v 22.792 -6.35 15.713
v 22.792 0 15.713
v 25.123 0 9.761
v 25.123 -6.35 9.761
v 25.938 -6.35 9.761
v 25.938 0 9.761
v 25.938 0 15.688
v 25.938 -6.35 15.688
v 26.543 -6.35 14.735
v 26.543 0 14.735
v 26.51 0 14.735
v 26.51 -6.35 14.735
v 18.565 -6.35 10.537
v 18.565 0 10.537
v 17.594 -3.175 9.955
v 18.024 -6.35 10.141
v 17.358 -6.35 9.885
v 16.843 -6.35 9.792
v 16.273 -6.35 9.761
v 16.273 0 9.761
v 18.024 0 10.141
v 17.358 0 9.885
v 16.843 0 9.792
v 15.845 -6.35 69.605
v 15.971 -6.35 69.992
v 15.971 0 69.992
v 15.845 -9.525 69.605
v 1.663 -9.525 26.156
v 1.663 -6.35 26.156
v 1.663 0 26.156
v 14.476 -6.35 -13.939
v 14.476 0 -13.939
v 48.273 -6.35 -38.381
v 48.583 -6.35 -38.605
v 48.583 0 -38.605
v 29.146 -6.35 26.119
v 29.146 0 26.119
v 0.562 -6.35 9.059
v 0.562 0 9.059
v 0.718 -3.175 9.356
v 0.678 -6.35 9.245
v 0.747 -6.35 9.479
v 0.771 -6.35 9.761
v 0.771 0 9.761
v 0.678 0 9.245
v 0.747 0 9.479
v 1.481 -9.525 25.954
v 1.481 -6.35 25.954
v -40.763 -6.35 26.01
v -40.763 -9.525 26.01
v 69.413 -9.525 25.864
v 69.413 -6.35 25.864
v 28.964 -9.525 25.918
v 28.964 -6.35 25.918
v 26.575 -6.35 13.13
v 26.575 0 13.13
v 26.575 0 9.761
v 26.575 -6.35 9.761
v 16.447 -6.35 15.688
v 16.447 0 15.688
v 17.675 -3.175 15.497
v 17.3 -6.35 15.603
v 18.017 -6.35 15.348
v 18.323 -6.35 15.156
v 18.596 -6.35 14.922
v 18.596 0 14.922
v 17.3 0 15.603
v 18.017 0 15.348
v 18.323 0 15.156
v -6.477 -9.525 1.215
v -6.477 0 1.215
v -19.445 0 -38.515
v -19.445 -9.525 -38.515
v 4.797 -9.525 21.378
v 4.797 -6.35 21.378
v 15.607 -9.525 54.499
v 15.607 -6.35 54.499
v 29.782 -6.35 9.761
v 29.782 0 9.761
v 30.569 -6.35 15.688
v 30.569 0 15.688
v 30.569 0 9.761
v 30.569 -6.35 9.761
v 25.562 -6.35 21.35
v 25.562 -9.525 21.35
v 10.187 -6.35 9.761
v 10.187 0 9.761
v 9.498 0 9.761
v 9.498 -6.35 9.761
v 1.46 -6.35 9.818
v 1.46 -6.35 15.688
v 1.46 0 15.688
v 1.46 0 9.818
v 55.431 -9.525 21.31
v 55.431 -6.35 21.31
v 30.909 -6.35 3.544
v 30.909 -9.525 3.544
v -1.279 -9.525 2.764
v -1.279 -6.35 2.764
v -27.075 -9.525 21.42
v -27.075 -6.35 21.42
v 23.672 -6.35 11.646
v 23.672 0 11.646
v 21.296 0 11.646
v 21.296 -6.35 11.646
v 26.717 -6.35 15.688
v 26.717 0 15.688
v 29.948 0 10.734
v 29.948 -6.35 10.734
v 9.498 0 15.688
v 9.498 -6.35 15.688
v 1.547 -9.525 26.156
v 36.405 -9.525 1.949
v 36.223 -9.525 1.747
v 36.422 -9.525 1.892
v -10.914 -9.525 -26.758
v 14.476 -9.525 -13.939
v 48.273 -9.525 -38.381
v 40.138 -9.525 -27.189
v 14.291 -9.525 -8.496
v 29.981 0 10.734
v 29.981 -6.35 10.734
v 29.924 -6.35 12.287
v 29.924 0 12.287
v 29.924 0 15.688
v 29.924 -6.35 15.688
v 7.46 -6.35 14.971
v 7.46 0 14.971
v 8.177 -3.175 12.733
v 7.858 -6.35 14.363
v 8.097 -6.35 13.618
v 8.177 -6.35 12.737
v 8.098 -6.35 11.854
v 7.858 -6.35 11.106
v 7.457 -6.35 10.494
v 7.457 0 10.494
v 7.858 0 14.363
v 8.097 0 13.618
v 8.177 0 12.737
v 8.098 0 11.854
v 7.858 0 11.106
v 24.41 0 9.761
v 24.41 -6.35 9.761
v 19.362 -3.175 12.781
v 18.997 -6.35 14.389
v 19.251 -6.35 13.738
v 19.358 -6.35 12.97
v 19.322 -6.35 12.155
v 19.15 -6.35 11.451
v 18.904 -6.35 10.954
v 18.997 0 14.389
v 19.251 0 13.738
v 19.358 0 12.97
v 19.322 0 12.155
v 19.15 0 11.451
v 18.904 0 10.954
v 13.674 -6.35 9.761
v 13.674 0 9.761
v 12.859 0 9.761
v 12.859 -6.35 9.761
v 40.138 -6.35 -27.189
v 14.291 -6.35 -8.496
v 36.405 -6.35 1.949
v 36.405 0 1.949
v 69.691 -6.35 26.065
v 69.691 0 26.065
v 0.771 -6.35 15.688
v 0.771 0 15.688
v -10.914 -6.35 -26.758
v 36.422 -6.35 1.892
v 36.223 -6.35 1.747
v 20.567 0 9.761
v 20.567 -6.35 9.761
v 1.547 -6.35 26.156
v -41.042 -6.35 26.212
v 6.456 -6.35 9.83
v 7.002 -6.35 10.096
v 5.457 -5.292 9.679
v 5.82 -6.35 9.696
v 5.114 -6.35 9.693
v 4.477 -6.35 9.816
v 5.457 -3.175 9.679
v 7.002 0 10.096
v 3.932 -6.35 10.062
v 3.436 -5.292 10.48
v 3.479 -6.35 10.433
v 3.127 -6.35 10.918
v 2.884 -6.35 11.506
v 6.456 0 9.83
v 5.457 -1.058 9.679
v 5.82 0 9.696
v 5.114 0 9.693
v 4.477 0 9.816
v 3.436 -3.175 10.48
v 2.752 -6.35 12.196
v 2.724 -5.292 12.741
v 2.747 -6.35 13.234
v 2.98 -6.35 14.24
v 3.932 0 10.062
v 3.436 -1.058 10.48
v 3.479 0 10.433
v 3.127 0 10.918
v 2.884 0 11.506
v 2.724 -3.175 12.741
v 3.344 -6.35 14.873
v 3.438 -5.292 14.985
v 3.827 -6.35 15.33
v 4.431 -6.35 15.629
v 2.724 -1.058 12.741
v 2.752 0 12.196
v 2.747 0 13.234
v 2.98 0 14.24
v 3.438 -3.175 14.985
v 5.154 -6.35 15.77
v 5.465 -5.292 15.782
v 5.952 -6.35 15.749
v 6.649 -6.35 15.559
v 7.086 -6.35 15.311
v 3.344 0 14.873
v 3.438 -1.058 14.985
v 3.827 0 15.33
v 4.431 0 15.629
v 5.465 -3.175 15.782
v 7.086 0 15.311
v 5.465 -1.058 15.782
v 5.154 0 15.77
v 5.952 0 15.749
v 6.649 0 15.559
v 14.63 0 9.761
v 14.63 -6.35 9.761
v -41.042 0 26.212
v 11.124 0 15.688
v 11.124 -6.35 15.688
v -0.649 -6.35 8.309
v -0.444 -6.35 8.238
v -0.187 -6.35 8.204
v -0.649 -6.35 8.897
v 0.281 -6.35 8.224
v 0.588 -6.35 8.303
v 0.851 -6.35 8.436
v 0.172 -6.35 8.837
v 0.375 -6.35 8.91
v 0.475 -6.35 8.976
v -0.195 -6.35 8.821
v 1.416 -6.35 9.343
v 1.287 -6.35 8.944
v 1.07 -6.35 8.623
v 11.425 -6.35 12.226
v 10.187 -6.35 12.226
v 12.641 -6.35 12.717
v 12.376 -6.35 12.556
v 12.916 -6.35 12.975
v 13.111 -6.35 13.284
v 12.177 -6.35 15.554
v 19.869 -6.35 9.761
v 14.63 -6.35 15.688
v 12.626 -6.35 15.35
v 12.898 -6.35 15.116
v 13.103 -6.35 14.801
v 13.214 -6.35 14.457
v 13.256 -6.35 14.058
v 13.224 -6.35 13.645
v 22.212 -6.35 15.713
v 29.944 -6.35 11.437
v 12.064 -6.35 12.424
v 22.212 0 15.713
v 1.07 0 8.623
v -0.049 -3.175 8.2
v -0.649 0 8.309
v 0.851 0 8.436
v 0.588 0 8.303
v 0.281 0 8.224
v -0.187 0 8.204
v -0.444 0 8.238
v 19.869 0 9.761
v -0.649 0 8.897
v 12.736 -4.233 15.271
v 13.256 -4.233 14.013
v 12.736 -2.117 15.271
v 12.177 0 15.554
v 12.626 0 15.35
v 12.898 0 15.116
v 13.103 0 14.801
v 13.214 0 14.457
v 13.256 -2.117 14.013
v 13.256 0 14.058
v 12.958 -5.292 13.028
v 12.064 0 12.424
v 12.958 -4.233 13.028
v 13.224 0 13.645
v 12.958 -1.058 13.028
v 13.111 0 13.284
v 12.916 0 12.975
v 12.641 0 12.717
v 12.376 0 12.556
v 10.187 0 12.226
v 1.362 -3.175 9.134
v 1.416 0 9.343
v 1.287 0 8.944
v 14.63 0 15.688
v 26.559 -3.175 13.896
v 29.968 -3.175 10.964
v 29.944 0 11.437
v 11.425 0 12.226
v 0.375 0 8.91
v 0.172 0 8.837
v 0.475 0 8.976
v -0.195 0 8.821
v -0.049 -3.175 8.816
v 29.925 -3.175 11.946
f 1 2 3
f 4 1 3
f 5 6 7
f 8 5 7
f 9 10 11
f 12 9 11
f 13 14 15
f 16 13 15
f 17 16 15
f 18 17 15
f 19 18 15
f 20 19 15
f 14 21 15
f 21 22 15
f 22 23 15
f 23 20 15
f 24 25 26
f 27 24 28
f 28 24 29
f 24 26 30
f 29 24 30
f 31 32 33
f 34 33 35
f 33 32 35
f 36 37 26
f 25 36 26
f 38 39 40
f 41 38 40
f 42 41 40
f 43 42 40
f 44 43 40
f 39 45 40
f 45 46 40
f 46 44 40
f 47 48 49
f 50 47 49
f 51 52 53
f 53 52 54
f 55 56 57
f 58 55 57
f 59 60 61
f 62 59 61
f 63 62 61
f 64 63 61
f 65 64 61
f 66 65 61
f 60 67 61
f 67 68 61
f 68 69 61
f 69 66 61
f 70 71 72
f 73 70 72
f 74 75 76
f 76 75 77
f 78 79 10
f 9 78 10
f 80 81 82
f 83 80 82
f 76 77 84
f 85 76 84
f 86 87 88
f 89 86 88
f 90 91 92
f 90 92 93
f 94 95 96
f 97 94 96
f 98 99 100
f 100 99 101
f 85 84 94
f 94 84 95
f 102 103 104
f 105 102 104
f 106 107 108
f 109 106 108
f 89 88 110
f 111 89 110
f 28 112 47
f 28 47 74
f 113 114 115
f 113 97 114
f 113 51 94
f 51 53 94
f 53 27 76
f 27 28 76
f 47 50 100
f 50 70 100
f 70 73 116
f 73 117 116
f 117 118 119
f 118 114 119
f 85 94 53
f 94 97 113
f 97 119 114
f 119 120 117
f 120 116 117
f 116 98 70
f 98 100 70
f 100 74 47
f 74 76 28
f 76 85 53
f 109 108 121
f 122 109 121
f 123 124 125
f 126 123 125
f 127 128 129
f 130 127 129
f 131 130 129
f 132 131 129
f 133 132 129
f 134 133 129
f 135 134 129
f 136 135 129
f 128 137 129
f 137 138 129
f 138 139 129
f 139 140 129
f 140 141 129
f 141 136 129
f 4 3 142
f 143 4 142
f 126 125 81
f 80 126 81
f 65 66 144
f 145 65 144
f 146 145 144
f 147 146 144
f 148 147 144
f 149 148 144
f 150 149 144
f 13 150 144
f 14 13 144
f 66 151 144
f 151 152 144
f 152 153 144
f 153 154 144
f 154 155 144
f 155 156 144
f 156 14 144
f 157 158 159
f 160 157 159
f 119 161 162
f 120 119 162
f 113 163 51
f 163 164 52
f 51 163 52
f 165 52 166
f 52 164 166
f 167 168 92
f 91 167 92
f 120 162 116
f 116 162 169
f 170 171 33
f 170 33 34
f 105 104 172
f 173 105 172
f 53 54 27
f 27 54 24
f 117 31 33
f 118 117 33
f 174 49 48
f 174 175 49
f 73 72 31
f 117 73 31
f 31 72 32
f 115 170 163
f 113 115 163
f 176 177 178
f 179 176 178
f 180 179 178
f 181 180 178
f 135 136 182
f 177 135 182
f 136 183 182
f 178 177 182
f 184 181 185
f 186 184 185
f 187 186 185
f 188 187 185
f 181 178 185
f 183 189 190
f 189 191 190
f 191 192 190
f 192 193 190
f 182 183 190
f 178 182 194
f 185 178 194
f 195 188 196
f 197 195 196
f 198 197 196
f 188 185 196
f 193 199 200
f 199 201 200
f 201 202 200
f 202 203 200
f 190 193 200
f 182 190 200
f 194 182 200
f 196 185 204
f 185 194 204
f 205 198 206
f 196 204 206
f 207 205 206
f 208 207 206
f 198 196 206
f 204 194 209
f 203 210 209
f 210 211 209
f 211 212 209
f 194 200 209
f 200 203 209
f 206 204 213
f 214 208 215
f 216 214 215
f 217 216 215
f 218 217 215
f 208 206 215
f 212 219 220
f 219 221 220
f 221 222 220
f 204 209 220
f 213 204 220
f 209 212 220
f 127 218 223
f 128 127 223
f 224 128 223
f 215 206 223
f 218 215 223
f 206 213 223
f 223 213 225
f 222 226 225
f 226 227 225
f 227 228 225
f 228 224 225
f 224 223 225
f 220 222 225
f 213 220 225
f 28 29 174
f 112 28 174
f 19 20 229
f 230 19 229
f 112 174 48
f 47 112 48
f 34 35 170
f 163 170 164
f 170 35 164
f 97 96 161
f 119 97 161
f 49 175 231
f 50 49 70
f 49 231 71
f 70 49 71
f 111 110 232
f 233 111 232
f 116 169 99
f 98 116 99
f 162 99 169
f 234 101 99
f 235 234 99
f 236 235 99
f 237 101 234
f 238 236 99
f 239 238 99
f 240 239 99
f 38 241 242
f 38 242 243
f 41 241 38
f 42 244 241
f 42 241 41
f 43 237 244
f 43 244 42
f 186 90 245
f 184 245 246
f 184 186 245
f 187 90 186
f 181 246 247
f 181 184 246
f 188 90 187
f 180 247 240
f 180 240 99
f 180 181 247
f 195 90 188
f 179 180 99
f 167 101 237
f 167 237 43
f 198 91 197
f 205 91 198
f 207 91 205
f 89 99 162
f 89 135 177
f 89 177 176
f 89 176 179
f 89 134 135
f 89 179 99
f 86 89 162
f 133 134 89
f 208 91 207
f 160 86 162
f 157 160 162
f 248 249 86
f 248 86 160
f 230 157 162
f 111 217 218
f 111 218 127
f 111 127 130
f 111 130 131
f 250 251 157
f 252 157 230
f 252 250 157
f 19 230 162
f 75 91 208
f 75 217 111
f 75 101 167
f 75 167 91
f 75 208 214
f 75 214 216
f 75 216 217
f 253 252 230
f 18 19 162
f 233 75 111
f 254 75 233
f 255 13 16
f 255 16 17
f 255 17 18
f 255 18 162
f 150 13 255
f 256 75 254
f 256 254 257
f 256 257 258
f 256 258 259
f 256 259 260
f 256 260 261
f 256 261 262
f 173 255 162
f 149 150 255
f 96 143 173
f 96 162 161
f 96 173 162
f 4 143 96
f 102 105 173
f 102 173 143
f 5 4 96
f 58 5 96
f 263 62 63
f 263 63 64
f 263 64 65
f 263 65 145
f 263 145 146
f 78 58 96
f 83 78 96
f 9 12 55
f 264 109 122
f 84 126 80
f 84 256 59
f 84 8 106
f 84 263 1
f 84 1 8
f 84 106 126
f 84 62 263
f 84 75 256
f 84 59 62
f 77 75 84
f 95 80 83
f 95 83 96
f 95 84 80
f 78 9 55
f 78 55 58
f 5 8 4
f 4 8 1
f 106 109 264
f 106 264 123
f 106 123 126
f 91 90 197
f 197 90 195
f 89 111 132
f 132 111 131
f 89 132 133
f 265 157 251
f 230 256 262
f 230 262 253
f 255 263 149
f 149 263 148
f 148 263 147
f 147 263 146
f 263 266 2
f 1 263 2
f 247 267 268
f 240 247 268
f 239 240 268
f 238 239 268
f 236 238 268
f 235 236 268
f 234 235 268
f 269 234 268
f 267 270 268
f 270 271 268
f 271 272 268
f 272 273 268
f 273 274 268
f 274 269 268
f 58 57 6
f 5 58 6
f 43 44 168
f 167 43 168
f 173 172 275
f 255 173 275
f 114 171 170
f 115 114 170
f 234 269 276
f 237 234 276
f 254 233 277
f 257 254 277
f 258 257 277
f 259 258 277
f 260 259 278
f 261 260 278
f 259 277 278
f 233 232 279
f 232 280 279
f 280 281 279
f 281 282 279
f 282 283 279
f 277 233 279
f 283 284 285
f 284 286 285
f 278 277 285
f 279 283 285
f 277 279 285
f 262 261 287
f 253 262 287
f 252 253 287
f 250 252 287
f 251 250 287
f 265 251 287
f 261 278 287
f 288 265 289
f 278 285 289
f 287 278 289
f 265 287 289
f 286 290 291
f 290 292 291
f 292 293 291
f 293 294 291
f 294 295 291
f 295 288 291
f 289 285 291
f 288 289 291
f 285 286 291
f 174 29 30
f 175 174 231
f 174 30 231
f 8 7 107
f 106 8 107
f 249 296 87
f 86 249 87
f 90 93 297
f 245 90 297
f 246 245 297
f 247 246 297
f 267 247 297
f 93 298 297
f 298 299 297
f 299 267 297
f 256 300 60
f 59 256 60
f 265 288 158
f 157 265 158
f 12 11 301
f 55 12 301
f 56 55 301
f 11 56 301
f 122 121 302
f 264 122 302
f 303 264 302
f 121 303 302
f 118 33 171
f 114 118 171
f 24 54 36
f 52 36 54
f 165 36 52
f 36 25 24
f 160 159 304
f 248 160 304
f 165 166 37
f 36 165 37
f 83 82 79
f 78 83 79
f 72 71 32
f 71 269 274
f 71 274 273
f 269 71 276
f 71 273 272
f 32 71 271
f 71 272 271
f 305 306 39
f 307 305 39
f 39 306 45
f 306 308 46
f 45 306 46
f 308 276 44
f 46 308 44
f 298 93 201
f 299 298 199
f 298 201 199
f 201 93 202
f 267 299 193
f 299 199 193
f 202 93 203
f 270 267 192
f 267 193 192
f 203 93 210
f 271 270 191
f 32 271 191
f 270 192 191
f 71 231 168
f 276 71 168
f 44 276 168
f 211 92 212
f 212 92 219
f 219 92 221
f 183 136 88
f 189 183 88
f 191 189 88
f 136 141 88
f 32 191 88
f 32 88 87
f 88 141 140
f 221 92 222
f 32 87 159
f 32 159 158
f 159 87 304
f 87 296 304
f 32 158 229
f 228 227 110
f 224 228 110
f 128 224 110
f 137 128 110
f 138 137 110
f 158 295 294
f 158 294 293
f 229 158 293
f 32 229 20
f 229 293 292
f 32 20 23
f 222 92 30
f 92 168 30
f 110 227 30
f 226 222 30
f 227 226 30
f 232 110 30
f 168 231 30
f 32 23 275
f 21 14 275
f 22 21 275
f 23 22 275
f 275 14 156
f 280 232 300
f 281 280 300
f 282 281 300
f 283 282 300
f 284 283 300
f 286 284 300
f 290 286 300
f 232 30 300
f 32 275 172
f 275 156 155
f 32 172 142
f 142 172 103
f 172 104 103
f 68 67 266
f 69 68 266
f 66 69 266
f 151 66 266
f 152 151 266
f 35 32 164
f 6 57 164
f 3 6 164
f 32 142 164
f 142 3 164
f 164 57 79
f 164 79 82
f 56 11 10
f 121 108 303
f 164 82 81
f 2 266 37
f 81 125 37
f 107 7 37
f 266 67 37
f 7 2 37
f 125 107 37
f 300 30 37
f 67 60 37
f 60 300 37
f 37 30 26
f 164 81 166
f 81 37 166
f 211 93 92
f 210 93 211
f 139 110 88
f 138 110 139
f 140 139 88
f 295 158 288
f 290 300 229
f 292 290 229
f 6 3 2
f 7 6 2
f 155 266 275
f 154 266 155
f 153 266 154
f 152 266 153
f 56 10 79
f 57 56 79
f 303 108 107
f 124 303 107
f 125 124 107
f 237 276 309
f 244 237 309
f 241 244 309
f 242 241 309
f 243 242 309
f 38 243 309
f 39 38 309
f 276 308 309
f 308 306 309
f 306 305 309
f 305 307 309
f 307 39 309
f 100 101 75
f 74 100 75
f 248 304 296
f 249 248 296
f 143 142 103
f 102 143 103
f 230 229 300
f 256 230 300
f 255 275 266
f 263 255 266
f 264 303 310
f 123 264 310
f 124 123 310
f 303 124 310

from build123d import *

# Parameters (mm, degrees)
F1_DEPTH = 6.35
F3_DEPTH = 3.175


with BuildPart() as f1:
    # F0 (on Front) → F1 (new body)
    with BuildSketch(Plane.XZ):
        Polygon((36.4045640823, 1.9488933967), (69.6907226001, 26.065217087), (29.1461811696, 26.1190709712), (15.9708538221, 69.9924798862), (1.6629783111, 26.15557594), (-41.0424164863, 26.2123000095), (-6.4774139305, 1.2147947246), (-19.4446871391, -38.5147311336), (14.4759376997, -13.9387270281), (48.5830571498, -38.6050899867), align=None)
        with BuildLine():
            add(Edge.make_bspline(
                [(1.0703261445, 8.6234759039), (0.6811166374, 8.1998862237), (-0.0492998709, 8.1998862237)],
                knots=[0, 0, 0, 1, 1, 1], degree=2))
            add(Edge.make_bspline(
                [(-0.0492998709, 8.1998862237), (-0.4294278228, 8.1998862237), (-0.6486825118, 8.3088648857)],
                knots=[0, 0, 0, 1, 1, 1], degree=2))
            Line((-0.6486825118, 8.3088648857), (-0.6486825118, 8.8965712414))
            add(Edge.make_bspline(
                [(-0.6486825118, 8.8965712414), (-0.3606674766, 8.81613461), (-0.0492998709, 8.81613461)],
                knots=[0, 0, 0, 1, 1, 1], degree=2))
            add(Edge.make_bspline(
                [(-0.0492998709, 8.81613461), (0.3528832864, 8.81613461), (0.5617590552, 9.0593905519)],
                knots=[0, 0, 0, 1, 1, 1], degree=2))
            add(Edge.make_bspline(
                [(0.5617590552, 9.0593905519), (0.7706348241, 9.3026464938), (0.7706348241, 9.7606163472)],
                knots=[0, 0, 0, 1, 1, 1], degree=2))
            Line((0.7706348241, 9.7606163472), (0.7706348241, 15.6882771403))
            Line((0.7706348241, 15.6882771403), (1.4595356516, 15.6882771403))
            Line((1.4595356516, 15.6882771403), (1.4595356516, 9.8177004082))
            add(Edge.make_bspline(
                [(1.4595356516, 9.8177004082), (1.4595356516, 9.0470655842), (1.0703261445, 8.6234759039)],
                knots=[0, 0, 0, 1, 1, 1], degree=2))
        make_face(mode=Mode.SUBTRACT)
        with BuildLine():
            add(Edge.make_bspline(
                [(7.4598488861, 14.9708342823), (8.1772917442, 14.1599811425), (8.1772917442, 12.7328796164)],
                knots=[0, 0, 0, 1, 1, 1], degree=2))
            add(Edge.make_bspline(
                [(8.1772917442, 12.7328796164), (8.1772917442, 11.3096701855), (7.4572541561, 10.4942762681)],
                knots=[0, 0, 0, 1, 1, 1], degree=2))
            add(Edge.make_bspline(
                [(7.4572541561, 10.4942762681), (6.7372165679, 9.6788823507), (5.4567172896, 9.6788823507)],
                knots=[0, 0, 0, 1, 1, 1], degree=2))
            add(Edge.make_bspline(
                [(5.4567172896, 9.6788823507), (4.1476759807, 9.6788823507), (3.4360712652, 10.4800052528)],
                knots=[0, 0, 0, 1, 1, 1], degree=2))
            add(Edge.make_bspline(
                [(3.4360712652, 10.4800052528), (2.7244665497, 11.2811281549), (2.7244665497, 12.7406638066)],
                knots=[0, 0, 0, 1, 1, 1], degree=2))
            add(Edge.make_bspline(
                [(2.7244665497, 12.7406638066), (2.7244665497, 14.188523173), (3.4380173127, 14.9851052975)],
                knots=[0, 0, 0, 1, 1, 1], degree=2))
            add(Edge.make_bspline(
                [(3.4380173127, 14.9851052975), (4.1515680757, 15.781687422), (5.4645014797, 15.781687422)],
                knots=[0, 0, 0, 1, 1, 1], degree=2))
            add(Edge.make_bspline(
                [(5.4645014797, 15.781687422), (6.742406028, 15.781687422), (7.4598488861, 14.9708342823)],
                knots=[0, 0, 0, 1, 1, 1], degree=2))
        make_face(mode=Mode.SUBTRACT)
        with BuildLine():
            Line((11.4245963984, 12.2256098922), (10.1869101659, 12.2256098922))
            Line((10.1869101659, 12.2256098922), (10.1869101659, 9.7606163472))
            Line((10.1869101659, 9.7606163472), (9.4980093383, 9.7606163472))
            Line((9.4980093383, 9.7606163472), (9.4980093383, 15.6882771403))
            Line((9.4980093383, 15.6882771403), (11.1236077129, 15.6882771403))
            add(Edge.make_bspline(
                [(11.1236077129, 15.6882771403), (12.2146916979, 15.6882771403), (12.7355837549, 15.2705256027)],
                knots=[0, 0, 0, 1, 1, 1], degree=2))
            add(Edge.make_bspline(
                [(12.7355837549, 15.2705256027), (13.2564758119, 14.8527740651), (13.2564758119, 14.0133788948)],
                knots=[0, 0, 0, 1, 1, 1], degree=2))
            add(Edge.make_bspline(
                [(13.2564758119, 14.0133788948), (13.2564758119, 12.8379661833), (12.0641973551, 12.4241067408)],
                knots=[0, 0, 0, 1, 1, 1], degree=2))
            Line((12.0641973551, 12.4241067408), (13.6742273495, 9.7606163472))
            Line((13.6742273495, 9.7606163472), (12.8594821146, 9.7606163472))
            Line((12.8594821146, 9.7606163472), (11.4245963984, 12.2256098922))
        make_face(mode=Mode.SUBTRACT)
        with BuildLine():
            add(Edge.make_bspline(
                [(18.5957815668, 14.9221830939), (19.3618756133, 14.1560890474), (19.3618756133, 12.7808821223)],
                knots=[0, 0, 0, 1, 1, 1], degree=2))
            add(Edge.make_bspline(
                [(19.3618756133, 12.7808821223), (19.3618756133, 11.3135622805), (18.5652934887, 10.5370893139)],
                knots=[0, 0, 0, 1, 1, 1], degree=2))
            add(Edge.make_bspline(
                [(18.5652934887, 10.5370893139), (17.7687113642, 9.7606163472), (16.2728494919, 9.7606163472)],
                knots=[0, 0, 0, 1, 1, 1], degree=2))
            Line((16.2728494919, 9.7606163472), (14.6303853719, 9.7606163472))
            Line((14.6303853719, 9.7606163472), (14.6303853719, 15.6882771403))
            Line((14.6303853719, 15.6882771403), (16.4466964051, 15.6882771403))
            add(Edge.make_bspline(
                [(16.4466964051, 15.6882771403), (17.8296875203, 15.6882771403), (18.5957815668, 14.9221830939)],
                knots=[0, 0, 0, 1, 1, 1], degree=2))
        make_face(mode=Mode.SUBTRACT)
        Polygon((25.1234736834, 9.7606163472), (24.4099229204, 9.7606163472), (23.6717222219, 11.6456877266), (21.2962468635, 11.6456877266), (20.5671277202, 9.7606163472), (19.8691453375, 9.7606163472), (22.2121865703, 15.7129270758), (22.7921087358, 15.7129270758), align=None, mode=Mode.SUBTRACT)
        with BuildLine():
            Line((30.5685146877, 15.6882771403), (30.5685146877, 9.7606163472))
            Line((30.5685146877, 9.7606163472), (29.7823114834, 9.7606163472))
            Line((29.7823114834, 9.7606163472), (26.5427910193, 14.7347138479))
            Line((26.5427910193, 14.7347138479), (26.5103568937, 14.7347138479))
            add(Edge.make_bspline(
                [(26.5103568937, 14.7347138479), (26.5752251449, 13.858992457), (26.5752251449, 13.1298733137)],
                knots=[0, 0, 0, 1, 1, 1], degree=2))
            Line((26.5752251449, 13.1298733137), (26.5752251449, 9.7606163472))
            Line((26.5752251449, 9.7606163472), (25.9382189182, 9.7606163472))
            Line((25.9382189182, 9.7606163472), (25.9382189182, 15.6882771403))
            Line((25.9382189182, 15.6882771403), (26.7166379324, 15.6882771403))
            Line((26.7166379324, 15.6882771403), (29.9483742064, 10.7336401149))
            Line((29.9483742064, 10.7336401149), (29.980808332, 10.7336401149))
            add(Edge.make_bspline(
                [(29.980808332, 10.7336401149), (29.9730241418, 10.8426187769), (29.9444821113, 11.4368119578)],
                knots=[0, 0, 0, 1, 1, 1], degree=2))
            add(Edge.make_bspline(
                [(29.9444821113, 11.4368119578), (29.9159400808, 12.0310051386), (29.9237242709, 12.2865860483)],
                knots=[0, 0, 0, 1, 1, 1], degree=2))
            Line((29.9237242709, 12.2865860483), (29.9237242709, 15.6882771403))
            Line((29.9237242709, 15.6882771403), (30.5685146877, 15.6882771403))
        make_face(mode=Mode.SUBTRACT)
    extrude(amount=F1_DEPTH)

    # F2 (on face) → F3 (join)
    with BuildSketch(Plane.XZ.offset(6.35)):
        Polygon((36.4045640823, 1.9488933967), (69.4127031084, 25.8637877737), (28.9641653483, 25.9175141396), (15.8445339726, 69.6054572911), (1.6629783111, 26.15557594), (1.5467987544, 26.1557302572), (1.4809624898, 25.9540191084), (-40.7628684516, 26.0101300989), (-6.4774139305, 1.2147947246), (-19.4446871391, -38.5147311336), (14.4759376997, -13.9387270281), (48.2732234246, -38.3810173811), (36.222548261, 1.7473365651), (36.421750894, 1.891661876), align=None)
        Polygon((55.4314800111, 21.3103554065), (30.9093811696, 3.5437250843), (40.1384522175, -27.1887794914), (14.2914917683, -8.4961863292), (-10.9143527112, -26.7582006747), (-1.2785905938, 2.7641402252), (-27.0746829363, 21.4199454322), (4.7966385236, 21.3776118802), (15.6072232815, 54.4994101005), (25.5620899488, 21.3500298636), align=None, mode=Mode.SUBTRACT)
    extrude(amount=F3_DEPTH)


solid = f1.part
